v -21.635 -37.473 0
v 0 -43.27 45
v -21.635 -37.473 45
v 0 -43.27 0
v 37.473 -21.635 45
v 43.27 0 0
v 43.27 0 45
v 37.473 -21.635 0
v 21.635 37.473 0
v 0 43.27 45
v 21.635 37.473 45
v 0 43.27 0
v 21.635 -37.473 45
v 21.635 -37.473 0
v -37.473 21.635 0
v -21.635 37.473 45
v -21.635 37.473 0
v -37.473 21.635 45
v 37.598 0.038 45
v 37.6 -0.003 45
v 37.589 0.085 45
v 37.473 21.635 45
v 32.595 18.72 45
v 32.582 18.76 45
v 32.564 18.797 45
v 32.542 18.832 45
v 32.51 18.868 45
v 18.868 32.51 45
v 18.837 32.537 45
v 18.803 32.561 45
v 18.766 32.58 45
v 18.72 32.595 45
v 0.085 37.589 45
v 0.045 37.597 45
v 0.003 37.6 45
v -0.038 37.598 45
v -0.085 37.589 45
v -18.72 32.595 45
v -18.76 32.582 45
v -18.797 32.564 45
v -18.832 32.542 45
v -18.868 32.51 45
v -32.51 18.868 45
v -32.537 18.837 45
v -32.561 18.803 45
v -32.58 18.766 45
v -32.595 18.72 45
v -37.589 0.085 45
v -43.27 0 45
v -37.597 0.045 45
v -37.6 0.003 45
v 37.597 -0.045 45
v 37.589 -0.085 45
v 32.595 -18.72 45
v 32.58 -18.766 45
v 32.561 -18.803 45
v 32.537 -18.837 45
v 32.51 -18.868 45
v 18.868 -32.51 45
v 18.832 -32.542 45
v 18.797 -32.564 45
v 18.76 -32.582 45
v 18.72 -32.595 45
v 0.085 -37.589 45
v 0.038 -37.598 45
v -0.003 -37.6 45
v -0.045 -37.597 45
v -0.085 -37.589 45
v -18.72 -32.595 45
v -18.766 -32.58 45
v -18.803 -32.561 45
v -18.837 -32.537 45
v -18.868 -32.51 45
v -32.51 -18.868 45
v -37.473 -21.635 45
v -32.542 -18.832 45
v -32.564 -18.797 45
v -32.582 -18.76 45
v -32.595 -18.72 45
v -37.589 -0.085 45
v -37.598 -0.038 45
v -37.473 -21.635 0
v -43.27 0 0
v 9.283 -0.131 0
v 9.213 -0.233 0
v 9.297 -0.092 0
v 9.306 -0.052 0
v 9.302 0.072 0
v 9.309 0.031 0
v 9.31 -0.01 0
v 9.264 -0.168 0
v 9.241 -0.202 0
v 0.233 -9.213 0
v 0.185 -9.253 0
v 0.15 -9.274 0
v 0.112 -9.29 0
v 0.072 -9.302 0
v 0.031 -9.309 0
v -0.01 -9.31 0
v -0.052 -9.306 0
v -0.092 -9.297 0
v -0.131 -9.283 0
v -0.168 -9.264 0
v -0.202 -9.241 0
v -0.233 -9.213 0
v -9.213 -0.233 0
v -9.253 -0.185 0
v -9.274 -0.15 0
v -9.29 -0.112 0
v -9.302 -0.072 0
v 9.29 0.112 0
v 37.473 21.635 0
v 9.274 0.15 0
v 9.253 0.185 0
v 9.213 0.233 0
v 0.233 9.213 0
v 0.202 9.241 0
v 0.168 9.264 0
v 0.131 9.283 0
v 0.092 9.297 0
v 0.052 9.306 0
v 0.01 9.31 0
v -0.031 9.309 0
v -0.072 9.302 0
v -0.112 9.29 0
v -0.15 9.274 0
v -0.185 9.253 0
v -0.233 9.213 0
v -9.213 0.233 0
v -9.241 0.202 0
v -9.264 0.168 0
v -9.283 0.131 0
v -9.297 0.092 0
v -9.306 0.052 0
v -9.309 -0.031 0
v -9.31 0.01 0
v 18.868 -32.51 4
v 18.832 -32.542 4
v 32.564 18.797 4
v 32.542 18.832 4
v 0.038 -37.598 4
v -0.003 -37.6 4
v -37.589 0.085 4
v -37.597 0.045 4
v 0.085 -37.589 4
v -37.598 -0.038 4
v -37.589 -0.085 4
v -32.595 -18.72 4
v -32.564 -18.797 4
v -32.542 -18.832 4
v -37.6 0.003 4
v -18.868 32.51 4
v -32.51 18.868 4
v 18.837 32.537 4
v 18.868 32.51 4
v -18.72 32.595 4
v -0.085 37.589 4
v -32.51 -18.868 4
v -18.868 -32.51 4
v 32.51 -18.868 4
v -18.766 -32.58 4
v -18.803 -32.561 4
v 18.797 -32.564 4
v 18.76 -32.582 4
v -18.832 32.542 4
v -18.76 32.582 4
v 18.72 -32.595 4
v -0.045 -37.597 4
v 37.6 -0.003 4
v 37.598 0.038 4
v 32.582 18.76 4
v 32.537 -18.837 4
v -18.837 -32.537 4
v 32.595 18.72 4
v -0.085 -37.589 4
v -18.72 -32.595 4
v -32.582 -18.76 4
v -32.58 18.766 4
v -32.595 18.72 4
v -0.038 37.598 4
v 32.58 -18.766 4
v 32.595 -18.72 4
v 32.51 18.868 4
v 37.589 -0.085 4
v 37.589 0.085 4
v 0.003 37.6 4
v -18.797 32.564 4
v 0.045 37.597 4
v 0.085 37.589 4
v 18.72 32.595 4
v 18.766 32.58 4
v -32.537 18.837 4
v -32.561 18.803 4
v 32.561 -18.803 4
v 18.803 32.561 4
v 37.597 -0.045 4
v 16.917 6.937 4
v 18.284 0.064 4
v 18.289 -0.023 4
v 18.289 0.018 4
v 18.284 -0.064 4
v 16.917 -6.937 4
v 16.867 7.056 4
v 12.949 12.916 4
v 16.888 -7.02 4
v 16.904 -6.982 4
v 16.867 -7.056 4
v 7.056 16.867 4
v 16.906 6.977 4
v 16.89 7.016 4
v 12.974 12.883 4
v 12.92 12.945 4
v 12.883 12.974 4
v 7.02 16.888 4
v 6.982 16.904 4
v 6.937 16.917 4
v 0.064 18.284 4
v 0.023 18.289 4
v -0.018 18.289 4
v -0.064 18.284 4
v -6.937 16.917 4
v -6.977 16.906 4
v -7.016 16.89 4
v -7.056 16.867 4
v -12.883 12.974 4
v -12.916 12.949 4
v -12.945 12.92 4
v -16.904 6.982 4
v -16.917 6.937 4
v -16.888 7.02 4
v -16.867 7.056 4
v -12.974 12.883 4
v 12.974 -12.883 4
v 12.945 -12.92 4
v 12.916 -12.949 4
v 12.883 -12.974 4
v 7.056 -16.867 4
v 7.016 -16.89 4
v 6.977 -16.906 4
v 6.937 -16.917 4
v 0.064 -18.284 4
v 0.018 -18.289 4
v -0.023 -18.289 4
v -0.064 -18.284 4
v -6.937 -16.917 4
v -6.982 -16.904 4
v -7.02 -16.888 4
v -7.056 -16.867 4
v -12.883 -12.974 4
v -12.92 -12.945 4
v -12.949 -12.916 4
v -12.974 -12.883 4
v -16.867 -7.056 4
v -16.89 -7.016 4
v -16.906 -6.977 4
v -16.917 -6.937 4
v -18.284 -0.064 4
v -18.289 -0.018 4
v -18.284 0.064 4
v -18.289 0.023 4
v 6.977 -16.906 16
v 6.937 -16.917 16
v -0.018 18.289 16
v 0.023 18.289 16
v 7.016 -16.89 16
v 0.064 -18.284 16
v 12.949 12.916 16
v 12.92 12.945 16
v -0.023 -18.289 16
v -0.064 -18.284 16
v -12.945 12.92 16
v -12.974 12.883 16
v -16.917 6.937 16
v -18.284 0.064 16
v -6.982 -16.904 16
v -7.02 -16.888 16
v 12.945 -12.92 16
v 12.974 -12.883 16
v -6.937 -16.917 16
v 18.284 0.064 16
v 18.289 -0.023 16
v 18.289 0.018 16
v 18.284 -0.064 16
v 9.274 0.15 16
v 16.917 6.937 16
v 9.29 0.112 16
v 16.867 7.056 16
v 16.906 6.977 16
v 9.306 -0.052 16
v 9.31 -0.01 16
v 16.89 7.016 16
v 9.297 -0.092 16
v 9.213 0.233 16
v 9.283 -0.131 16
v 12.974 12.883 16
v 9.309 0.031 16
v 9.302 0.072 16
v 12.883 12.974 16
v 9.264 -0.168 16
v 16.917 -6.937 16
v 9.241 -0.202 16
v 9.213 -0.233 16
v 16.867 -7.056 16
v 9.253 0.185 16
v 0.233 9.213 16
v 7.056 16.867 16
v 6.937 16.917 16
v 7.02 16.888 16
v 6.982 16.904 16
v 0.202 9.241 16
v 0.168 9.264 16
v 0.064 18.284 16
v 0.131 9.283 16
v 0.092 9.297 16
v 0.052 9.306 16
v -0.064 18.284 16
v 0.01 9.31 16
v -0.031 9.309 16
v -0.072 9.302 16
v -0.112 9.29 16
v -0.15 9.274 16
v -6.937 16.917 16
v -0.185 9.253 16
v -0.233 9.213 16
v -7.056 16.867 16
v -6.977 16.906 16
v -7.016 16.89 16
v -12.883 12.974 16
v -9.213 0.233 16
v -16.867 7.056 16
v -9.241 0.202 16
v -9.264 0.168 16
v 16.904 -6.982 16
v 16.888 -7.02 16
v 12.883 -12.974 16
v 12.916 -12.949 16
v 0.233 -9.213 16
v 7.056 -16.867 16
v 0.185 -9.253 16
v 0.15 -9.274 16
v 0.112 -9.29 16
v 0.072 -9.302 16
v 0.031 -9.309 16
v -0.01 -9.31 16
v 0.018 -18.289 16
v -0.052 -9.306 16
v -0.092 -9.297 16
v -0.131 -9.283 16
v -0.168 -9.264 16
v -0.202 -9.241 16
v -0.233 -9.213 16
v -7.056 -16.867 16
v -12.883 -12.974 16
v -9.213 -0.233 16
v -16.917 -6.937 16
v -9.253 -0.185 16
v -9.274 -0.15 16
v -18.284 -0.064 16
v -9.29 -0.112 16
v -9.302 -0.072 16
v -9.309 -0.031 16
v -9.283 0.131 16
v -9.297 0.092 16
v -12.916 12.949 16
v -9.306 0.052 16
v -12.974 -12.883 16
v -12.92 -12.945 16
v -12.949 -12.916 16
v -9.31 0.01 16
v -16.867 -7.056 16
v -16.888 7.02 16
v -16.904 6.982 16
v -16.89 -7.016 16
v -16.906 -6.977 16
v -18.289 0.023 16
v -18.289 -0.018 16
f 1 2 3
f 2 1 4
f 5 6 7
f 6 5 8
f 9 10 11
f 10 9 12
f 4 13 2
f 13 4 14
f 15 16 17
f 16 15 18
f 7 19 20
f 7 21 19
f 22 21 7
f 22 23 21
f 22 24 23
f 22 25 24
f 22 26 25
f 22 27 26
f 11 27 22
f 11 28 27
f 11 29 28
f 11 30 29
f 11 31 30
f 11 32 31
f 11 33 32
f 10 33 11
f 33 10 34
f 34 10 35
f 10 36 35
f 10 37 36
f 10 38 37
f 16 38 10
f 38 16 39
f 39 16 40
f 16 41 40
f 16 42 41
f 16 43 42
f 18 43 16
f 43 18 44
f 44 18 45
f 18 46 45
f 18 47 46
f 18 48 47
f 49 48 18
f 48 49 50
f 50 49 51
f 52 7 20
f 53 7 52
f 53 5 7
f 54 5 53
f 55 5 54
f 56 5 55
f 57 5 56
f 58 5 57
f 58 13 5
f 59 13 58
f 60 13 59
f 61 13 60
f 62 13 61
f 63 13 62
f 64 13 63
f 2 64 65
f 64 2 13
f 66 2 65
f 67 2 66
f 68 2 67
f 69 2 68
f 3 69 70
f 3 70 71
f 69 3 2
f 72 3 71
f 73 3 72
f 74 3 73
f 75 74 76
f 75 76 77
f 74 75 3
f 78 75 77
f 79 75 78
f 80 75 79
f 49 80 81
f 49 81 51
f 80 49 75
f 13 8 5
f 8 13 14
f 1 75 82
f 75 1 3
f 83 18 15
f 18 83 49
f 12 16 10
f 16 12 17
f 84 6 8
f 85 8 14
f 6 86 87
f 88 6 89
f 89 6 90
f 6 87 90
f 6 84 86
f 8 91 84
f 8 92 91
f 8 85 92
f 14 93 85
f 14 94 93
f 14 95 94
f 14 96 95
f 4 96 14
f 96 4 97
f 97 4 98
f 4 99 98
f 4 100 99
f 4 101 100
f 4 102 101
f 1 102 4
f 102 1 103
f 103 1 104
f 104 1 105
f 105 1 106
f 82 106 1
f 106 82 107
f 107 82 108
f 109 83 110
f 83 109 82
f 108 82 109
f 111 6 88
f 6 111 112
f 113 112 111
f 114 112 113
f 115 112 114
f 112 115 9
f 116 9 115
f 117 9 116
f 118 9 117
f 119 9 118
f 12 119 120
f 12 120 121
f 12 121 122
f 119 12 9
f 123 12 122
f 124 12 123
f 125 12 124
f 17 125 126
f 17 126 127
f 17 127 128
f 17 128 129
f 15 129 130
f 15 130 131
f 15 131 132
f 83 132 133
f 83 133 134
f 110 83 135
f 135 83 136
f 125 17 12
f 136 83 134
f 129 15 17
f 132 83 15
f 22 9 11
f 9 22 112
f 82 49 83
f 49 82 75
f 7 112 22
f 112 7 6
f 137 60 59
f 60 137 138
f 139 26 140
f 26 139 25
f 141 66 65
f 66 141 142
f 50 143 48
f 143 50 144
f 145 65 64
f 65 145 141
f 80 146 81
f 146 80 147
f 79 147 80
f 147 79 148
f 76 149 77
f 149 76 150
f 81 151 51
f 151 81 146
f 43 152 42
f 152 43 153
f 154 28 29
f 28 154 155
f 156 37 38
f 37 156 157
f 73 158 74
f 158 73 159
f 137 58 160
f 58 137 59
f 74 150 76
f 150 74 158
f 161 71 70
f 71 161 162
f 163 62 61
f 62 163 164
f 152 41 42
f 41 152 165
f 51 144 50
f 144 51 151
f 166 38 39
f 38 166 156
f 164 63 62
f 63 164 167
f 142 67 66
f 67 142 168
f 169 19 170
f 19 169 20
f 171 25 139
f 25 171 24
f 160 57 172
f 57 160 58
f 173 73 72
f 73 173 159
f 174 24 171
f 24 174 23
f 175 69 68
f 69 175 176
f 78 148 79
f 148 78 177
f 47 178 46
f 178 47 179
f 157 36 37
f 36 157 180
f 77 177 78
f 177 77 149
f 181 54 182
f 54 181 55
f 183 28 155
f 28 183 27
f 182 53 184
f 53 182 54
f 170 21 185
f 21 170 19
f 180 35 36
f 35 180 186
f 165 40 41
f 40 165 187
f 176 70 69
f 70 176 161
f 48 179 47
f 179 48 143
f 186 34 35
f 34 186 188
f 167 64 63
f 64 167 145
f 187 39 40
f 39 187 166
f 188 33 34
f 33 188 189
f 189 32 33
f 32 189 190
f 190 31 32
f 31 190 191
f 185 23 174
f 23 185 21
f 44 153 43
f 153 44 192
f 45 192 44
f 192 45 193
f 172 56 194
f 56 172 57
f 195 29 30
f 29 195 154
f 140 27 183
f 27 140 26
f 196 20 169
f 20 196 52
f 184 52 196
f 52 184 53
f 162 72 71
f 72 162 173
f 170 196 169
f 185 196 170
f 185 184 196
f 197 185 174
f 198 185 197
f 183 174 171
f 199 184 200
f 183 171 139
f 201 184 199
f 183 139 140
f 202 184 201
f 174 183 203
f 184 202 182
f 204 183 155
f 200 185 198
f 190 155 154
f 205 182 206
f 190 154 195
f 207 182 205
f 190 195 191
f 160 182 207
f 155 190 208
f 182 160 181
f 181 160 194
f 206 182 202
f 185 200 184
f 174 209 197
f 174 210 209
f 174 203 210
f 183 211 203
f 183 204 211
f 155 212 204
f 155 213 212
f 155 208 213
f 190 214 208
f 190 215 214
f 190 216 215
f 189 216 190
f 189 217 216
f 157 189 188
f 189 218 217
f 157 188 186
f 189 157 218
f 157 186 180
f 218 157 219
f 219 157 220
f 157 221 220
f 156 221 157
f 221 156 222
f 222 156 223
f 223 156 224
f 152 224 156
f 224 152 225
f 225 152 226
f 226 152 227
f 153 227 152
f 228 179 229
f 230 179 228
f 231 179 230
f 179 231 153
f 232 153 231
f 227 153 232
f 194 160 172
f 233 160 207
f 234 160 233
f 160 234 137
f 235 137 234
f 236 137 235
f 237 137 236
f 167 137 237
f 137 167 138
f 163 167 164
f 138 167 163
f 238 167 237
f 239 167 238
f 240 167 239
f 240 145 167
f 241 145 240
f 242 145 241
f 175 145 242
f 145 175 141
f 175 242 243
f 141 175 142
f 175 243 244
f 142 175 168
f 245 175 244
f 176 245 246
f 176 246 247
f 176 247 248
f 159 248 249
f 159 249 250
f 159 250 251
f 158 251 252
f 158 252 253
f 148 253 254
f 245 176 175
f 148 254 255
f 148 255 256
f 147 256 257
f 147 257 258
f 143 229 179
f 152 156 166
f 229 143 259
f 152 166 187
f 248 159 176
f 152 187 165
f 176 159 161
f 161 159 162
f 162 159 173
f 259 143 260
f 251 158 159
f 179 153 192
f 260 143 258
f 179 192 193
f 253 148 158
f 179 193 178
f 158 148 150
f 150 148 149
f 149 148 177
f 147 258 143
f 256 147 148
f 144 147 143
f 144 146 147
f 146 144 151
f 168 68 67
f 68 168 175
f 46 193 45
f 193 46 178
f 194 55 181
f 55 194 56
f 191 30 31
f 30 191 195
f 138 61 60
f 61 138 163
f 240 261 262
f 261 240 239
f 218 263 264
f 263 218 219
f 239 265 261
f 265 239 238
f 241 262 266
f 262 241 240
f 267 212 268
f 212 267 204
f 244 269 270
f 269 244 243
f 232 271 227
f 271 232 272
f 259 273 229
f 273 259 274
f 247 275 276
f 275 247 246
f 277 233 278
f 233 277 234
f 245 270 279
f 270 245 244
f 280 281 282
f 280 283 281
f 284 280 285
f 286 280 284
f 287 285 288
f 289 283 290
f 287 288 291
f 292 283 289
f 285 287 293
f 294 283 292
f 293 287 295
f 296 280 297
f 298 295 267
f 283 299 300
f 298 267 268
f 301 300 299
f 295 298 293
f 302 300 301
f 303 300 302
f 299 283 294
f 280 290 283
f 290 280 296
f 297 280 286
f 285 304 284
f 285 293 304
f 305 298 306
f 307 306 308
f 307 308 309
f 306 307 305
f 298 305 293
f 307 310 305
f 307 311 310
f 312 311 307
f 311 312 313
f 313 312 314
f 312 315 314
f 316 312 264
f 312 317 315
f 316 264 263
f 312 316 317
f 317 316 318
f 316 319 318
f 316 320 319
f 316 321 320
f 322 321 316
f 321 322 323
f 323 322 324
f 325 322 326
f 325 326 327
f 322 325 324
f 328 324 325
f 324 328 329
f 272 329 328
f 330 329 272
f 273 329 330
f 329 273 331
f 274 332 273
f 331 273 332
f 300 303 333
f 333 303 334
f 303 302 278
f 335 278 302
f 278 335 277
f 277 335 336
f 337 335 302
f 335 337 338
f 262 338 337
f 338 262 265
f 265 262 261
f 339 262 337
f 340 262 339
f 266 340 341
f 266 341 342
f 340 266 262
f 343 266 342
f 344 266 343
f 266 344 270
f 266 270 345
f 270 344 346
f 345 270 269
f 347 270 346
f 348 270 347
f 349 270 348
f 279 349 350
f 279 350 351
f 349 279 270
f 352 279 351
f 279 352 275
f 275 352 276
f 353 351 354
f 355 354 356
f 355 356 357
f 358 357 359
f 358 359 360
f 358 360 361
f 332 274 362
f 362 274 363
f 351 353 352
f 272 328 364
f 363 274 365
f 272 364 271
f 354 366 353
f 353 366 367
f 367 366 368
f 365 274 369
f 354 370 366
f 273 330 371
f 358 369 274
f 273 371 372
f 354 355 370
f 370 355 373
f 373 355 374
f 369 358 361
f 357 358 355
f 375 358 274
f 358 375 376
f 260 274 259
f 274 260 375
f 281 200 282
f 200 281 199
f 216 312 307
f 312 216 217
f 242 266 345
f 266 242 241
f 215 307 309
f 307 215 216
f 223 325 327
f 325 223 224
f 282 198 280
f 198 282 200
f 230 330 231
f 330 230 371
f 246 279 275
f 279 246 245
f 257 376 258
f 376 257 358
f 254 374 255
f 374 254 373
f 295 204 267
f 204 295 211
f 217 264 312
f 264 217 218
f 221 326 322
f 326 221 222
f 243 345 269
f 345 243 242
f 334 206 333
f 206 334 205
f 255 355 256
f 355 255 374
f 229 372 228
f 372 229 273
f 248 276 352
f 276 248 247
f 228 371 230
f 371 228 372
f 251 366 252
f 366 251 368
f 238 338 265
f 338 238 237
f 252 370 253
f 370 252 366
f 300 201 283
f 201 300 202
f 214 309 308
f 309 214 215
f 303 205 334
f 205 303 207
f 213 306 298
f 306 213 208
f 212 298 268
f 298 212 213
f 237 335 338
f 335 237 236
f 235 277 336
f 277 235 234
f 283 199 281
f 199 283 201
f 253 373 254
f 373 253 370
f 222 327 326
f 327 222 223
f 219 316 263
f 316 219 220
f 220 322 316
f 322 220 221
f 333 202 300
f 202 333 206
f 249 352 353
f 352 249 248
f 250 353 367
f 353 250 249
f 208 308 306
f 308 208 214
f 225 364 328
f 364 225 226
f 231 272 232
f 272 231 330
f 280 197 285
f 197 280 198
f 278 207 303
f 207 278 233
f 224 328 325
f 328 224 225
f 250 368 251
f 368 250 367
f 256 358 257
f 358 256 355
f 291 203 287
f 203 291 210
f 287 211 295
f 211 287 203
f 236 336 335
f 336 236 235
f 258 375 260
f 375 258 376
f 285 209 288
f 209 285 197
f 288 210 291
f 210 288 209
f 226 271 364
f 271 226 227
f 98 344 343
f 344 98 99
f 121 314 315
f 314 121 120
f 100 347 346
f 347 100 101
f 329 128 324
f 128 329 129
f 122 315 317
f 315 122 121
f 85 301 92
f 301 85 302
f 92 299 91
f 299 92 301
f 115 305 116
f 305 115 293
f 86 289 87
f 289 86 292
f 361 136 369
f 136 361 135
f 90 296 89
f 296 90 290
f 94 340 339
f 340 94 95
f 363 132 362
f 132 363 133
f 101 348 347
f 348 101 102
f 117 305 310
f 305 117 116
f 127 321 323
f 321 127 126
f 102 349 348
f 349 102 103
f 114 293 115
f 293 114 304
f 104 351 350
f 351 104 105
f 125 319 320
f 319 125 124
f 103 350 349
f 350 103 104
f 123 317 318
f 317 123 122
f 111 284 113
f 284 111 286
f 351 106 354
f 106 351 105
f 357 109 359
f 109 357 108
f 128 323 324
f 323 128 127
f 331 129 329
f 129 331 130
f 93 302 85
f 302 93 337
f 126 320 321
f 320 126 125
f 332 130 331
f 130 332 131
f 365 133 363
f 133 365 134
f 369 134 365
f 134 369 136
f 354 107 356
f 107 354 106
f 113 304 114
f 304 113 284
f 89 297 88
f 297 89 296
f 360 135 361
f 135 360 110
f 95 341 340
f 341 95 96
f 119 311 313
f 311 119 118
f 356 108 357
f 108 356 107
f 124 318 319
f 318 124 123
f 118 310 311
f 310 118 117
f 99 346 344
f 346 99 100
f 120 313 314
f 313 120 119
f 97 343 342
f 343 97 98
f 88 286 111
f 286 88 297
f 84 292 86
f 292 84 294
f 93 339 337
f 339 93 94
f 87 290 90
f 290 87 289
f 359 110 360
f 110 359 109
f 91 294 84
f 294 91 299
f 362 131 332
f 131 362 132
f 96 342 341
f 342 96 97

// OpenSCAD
// A parametric filter wrench tool for OpenSCAD
//
// Erik Ness
// erik@nessnation.com
//
// NOTE:  All dimensions in mm except ratchet size
//
// Version 6:  2017 03 29 Added 1/4" drive, did not build or test it.
//             Not recommended, but requested by a user.
//
// version 5:  Use face-to-face measurement for even number of sides


//-------------------------------------------
//        User-entered parameters
//
//  Formatted for thingiverse customizer.
//-------------------------------------------

// Number of faces on filter body:
num_faces = 12;                     // [6:30]

// Diameter of filter body in mm.  Measure from face to face (even) or face to vertex (odd).
filter_diameter_mm = 72;

// Depth of usable portion of tool in mm.  (Height above bottom and drive).
usable_tool_depth_mm = 29;

// Ratchet drive size in inches.
drive_size_inches = 0.5;            // [0.25, 0.375, 0.5]

// Thickness of tool wall in mm.
wall_thickness_mm = 6;

// Thickness of tool bottom in mm.
bottom_thickness_mm = 4;

// Make the outside round?
round_outside = 0;                  // [0:No,1:Yes]




/* [Hidden] */

$fn=50;

// Compute the radius from center to inner corner:
angle = 180 / num_faces;
r_to_face_if_odd_mm = (cos(angle) / (1+cos(angle))) * filter_diameter_mm;
R_if_even_mm = (filter_diameter_mm / 2) / cos(angle);
is_odd = (num_faces % 2);
radius_to_corners_mm = is_odd ? filter_diameter_mm - r_to_face_if_odd_mm : R_if_even_mm;     // from center to "corner", not face
filter_slop_r_mm = 0.33;

//echo (radius_to_corners_mm);

// 1/2" drive is exactly 8.98mm radius
// 3/8" drive is exactly 6.74mm radius
// 1/4" drive is (maybe) 4.49mm radius (not recommended, not tested)
drive_hole_r_mm = (drive_size_inches < 0.3) ?  4.49 :     // 1/4" drive
                  (drive_size_inches > 0.4) ?  8.98 :     // 1/2" drive
                  6.74;                                   // 3/8" drive

// 1/2" drive is 16mm tall
// 3/8" drive is 11mm tall
// 1/4" drive is  9mm tall
drive_height_mm = (drive_size_inches < 0.3) ?  9.00 :     // 1/4" drive  
                  (drive_size_inches > 0.4) ? 16.00 :     // 1/2" drive
                  11.00;                                  // 3/8" drive

drive_hole_slop_r_mm = 0.33;
drive_thickness_r_mm = drive_hole_r_mm;

outside_faces = round_outside ? 100 : num_faces;
outside_height_mm = usable_tool_depth_mm + max(drive_height_mm,bottom_thickness_mm);



difference()
{
    union()
    {
        difference()
        {
            // Outside body:
            linear_extrude(outside_height_mm)
                my_regular_polygon(outside_faces, radius_to_corners_mm+wall_thickness_mm);
            
            // Main Polygon hole:
            translate([0,0,bottom_thickness_mm])
                linear_extrude(outside_height_mm - bottom_thickness_mm)
                    offset(filter_slop_r_mm)
                        my_regular_polygon(num_faces, radius_to_corners_mm);
        }

        // Drive body:
        linear_extrude(drive_height_mm)
            offset(drive_hole_slop_r_mm)
                my_regular_polygon(16,drive_hole_r_mm+drive_thickness_r_mm);
    }

    // Drive hole:
    linear_extrude(drive_height_mm)
        offset(drive_hole_slop_r_mm)
            my_regular_polygon(4,drive_hole_r_mm);
}





module my_regular_polygon(faces, radius)
{
    $fn = faces;
    circle(radius);
}
